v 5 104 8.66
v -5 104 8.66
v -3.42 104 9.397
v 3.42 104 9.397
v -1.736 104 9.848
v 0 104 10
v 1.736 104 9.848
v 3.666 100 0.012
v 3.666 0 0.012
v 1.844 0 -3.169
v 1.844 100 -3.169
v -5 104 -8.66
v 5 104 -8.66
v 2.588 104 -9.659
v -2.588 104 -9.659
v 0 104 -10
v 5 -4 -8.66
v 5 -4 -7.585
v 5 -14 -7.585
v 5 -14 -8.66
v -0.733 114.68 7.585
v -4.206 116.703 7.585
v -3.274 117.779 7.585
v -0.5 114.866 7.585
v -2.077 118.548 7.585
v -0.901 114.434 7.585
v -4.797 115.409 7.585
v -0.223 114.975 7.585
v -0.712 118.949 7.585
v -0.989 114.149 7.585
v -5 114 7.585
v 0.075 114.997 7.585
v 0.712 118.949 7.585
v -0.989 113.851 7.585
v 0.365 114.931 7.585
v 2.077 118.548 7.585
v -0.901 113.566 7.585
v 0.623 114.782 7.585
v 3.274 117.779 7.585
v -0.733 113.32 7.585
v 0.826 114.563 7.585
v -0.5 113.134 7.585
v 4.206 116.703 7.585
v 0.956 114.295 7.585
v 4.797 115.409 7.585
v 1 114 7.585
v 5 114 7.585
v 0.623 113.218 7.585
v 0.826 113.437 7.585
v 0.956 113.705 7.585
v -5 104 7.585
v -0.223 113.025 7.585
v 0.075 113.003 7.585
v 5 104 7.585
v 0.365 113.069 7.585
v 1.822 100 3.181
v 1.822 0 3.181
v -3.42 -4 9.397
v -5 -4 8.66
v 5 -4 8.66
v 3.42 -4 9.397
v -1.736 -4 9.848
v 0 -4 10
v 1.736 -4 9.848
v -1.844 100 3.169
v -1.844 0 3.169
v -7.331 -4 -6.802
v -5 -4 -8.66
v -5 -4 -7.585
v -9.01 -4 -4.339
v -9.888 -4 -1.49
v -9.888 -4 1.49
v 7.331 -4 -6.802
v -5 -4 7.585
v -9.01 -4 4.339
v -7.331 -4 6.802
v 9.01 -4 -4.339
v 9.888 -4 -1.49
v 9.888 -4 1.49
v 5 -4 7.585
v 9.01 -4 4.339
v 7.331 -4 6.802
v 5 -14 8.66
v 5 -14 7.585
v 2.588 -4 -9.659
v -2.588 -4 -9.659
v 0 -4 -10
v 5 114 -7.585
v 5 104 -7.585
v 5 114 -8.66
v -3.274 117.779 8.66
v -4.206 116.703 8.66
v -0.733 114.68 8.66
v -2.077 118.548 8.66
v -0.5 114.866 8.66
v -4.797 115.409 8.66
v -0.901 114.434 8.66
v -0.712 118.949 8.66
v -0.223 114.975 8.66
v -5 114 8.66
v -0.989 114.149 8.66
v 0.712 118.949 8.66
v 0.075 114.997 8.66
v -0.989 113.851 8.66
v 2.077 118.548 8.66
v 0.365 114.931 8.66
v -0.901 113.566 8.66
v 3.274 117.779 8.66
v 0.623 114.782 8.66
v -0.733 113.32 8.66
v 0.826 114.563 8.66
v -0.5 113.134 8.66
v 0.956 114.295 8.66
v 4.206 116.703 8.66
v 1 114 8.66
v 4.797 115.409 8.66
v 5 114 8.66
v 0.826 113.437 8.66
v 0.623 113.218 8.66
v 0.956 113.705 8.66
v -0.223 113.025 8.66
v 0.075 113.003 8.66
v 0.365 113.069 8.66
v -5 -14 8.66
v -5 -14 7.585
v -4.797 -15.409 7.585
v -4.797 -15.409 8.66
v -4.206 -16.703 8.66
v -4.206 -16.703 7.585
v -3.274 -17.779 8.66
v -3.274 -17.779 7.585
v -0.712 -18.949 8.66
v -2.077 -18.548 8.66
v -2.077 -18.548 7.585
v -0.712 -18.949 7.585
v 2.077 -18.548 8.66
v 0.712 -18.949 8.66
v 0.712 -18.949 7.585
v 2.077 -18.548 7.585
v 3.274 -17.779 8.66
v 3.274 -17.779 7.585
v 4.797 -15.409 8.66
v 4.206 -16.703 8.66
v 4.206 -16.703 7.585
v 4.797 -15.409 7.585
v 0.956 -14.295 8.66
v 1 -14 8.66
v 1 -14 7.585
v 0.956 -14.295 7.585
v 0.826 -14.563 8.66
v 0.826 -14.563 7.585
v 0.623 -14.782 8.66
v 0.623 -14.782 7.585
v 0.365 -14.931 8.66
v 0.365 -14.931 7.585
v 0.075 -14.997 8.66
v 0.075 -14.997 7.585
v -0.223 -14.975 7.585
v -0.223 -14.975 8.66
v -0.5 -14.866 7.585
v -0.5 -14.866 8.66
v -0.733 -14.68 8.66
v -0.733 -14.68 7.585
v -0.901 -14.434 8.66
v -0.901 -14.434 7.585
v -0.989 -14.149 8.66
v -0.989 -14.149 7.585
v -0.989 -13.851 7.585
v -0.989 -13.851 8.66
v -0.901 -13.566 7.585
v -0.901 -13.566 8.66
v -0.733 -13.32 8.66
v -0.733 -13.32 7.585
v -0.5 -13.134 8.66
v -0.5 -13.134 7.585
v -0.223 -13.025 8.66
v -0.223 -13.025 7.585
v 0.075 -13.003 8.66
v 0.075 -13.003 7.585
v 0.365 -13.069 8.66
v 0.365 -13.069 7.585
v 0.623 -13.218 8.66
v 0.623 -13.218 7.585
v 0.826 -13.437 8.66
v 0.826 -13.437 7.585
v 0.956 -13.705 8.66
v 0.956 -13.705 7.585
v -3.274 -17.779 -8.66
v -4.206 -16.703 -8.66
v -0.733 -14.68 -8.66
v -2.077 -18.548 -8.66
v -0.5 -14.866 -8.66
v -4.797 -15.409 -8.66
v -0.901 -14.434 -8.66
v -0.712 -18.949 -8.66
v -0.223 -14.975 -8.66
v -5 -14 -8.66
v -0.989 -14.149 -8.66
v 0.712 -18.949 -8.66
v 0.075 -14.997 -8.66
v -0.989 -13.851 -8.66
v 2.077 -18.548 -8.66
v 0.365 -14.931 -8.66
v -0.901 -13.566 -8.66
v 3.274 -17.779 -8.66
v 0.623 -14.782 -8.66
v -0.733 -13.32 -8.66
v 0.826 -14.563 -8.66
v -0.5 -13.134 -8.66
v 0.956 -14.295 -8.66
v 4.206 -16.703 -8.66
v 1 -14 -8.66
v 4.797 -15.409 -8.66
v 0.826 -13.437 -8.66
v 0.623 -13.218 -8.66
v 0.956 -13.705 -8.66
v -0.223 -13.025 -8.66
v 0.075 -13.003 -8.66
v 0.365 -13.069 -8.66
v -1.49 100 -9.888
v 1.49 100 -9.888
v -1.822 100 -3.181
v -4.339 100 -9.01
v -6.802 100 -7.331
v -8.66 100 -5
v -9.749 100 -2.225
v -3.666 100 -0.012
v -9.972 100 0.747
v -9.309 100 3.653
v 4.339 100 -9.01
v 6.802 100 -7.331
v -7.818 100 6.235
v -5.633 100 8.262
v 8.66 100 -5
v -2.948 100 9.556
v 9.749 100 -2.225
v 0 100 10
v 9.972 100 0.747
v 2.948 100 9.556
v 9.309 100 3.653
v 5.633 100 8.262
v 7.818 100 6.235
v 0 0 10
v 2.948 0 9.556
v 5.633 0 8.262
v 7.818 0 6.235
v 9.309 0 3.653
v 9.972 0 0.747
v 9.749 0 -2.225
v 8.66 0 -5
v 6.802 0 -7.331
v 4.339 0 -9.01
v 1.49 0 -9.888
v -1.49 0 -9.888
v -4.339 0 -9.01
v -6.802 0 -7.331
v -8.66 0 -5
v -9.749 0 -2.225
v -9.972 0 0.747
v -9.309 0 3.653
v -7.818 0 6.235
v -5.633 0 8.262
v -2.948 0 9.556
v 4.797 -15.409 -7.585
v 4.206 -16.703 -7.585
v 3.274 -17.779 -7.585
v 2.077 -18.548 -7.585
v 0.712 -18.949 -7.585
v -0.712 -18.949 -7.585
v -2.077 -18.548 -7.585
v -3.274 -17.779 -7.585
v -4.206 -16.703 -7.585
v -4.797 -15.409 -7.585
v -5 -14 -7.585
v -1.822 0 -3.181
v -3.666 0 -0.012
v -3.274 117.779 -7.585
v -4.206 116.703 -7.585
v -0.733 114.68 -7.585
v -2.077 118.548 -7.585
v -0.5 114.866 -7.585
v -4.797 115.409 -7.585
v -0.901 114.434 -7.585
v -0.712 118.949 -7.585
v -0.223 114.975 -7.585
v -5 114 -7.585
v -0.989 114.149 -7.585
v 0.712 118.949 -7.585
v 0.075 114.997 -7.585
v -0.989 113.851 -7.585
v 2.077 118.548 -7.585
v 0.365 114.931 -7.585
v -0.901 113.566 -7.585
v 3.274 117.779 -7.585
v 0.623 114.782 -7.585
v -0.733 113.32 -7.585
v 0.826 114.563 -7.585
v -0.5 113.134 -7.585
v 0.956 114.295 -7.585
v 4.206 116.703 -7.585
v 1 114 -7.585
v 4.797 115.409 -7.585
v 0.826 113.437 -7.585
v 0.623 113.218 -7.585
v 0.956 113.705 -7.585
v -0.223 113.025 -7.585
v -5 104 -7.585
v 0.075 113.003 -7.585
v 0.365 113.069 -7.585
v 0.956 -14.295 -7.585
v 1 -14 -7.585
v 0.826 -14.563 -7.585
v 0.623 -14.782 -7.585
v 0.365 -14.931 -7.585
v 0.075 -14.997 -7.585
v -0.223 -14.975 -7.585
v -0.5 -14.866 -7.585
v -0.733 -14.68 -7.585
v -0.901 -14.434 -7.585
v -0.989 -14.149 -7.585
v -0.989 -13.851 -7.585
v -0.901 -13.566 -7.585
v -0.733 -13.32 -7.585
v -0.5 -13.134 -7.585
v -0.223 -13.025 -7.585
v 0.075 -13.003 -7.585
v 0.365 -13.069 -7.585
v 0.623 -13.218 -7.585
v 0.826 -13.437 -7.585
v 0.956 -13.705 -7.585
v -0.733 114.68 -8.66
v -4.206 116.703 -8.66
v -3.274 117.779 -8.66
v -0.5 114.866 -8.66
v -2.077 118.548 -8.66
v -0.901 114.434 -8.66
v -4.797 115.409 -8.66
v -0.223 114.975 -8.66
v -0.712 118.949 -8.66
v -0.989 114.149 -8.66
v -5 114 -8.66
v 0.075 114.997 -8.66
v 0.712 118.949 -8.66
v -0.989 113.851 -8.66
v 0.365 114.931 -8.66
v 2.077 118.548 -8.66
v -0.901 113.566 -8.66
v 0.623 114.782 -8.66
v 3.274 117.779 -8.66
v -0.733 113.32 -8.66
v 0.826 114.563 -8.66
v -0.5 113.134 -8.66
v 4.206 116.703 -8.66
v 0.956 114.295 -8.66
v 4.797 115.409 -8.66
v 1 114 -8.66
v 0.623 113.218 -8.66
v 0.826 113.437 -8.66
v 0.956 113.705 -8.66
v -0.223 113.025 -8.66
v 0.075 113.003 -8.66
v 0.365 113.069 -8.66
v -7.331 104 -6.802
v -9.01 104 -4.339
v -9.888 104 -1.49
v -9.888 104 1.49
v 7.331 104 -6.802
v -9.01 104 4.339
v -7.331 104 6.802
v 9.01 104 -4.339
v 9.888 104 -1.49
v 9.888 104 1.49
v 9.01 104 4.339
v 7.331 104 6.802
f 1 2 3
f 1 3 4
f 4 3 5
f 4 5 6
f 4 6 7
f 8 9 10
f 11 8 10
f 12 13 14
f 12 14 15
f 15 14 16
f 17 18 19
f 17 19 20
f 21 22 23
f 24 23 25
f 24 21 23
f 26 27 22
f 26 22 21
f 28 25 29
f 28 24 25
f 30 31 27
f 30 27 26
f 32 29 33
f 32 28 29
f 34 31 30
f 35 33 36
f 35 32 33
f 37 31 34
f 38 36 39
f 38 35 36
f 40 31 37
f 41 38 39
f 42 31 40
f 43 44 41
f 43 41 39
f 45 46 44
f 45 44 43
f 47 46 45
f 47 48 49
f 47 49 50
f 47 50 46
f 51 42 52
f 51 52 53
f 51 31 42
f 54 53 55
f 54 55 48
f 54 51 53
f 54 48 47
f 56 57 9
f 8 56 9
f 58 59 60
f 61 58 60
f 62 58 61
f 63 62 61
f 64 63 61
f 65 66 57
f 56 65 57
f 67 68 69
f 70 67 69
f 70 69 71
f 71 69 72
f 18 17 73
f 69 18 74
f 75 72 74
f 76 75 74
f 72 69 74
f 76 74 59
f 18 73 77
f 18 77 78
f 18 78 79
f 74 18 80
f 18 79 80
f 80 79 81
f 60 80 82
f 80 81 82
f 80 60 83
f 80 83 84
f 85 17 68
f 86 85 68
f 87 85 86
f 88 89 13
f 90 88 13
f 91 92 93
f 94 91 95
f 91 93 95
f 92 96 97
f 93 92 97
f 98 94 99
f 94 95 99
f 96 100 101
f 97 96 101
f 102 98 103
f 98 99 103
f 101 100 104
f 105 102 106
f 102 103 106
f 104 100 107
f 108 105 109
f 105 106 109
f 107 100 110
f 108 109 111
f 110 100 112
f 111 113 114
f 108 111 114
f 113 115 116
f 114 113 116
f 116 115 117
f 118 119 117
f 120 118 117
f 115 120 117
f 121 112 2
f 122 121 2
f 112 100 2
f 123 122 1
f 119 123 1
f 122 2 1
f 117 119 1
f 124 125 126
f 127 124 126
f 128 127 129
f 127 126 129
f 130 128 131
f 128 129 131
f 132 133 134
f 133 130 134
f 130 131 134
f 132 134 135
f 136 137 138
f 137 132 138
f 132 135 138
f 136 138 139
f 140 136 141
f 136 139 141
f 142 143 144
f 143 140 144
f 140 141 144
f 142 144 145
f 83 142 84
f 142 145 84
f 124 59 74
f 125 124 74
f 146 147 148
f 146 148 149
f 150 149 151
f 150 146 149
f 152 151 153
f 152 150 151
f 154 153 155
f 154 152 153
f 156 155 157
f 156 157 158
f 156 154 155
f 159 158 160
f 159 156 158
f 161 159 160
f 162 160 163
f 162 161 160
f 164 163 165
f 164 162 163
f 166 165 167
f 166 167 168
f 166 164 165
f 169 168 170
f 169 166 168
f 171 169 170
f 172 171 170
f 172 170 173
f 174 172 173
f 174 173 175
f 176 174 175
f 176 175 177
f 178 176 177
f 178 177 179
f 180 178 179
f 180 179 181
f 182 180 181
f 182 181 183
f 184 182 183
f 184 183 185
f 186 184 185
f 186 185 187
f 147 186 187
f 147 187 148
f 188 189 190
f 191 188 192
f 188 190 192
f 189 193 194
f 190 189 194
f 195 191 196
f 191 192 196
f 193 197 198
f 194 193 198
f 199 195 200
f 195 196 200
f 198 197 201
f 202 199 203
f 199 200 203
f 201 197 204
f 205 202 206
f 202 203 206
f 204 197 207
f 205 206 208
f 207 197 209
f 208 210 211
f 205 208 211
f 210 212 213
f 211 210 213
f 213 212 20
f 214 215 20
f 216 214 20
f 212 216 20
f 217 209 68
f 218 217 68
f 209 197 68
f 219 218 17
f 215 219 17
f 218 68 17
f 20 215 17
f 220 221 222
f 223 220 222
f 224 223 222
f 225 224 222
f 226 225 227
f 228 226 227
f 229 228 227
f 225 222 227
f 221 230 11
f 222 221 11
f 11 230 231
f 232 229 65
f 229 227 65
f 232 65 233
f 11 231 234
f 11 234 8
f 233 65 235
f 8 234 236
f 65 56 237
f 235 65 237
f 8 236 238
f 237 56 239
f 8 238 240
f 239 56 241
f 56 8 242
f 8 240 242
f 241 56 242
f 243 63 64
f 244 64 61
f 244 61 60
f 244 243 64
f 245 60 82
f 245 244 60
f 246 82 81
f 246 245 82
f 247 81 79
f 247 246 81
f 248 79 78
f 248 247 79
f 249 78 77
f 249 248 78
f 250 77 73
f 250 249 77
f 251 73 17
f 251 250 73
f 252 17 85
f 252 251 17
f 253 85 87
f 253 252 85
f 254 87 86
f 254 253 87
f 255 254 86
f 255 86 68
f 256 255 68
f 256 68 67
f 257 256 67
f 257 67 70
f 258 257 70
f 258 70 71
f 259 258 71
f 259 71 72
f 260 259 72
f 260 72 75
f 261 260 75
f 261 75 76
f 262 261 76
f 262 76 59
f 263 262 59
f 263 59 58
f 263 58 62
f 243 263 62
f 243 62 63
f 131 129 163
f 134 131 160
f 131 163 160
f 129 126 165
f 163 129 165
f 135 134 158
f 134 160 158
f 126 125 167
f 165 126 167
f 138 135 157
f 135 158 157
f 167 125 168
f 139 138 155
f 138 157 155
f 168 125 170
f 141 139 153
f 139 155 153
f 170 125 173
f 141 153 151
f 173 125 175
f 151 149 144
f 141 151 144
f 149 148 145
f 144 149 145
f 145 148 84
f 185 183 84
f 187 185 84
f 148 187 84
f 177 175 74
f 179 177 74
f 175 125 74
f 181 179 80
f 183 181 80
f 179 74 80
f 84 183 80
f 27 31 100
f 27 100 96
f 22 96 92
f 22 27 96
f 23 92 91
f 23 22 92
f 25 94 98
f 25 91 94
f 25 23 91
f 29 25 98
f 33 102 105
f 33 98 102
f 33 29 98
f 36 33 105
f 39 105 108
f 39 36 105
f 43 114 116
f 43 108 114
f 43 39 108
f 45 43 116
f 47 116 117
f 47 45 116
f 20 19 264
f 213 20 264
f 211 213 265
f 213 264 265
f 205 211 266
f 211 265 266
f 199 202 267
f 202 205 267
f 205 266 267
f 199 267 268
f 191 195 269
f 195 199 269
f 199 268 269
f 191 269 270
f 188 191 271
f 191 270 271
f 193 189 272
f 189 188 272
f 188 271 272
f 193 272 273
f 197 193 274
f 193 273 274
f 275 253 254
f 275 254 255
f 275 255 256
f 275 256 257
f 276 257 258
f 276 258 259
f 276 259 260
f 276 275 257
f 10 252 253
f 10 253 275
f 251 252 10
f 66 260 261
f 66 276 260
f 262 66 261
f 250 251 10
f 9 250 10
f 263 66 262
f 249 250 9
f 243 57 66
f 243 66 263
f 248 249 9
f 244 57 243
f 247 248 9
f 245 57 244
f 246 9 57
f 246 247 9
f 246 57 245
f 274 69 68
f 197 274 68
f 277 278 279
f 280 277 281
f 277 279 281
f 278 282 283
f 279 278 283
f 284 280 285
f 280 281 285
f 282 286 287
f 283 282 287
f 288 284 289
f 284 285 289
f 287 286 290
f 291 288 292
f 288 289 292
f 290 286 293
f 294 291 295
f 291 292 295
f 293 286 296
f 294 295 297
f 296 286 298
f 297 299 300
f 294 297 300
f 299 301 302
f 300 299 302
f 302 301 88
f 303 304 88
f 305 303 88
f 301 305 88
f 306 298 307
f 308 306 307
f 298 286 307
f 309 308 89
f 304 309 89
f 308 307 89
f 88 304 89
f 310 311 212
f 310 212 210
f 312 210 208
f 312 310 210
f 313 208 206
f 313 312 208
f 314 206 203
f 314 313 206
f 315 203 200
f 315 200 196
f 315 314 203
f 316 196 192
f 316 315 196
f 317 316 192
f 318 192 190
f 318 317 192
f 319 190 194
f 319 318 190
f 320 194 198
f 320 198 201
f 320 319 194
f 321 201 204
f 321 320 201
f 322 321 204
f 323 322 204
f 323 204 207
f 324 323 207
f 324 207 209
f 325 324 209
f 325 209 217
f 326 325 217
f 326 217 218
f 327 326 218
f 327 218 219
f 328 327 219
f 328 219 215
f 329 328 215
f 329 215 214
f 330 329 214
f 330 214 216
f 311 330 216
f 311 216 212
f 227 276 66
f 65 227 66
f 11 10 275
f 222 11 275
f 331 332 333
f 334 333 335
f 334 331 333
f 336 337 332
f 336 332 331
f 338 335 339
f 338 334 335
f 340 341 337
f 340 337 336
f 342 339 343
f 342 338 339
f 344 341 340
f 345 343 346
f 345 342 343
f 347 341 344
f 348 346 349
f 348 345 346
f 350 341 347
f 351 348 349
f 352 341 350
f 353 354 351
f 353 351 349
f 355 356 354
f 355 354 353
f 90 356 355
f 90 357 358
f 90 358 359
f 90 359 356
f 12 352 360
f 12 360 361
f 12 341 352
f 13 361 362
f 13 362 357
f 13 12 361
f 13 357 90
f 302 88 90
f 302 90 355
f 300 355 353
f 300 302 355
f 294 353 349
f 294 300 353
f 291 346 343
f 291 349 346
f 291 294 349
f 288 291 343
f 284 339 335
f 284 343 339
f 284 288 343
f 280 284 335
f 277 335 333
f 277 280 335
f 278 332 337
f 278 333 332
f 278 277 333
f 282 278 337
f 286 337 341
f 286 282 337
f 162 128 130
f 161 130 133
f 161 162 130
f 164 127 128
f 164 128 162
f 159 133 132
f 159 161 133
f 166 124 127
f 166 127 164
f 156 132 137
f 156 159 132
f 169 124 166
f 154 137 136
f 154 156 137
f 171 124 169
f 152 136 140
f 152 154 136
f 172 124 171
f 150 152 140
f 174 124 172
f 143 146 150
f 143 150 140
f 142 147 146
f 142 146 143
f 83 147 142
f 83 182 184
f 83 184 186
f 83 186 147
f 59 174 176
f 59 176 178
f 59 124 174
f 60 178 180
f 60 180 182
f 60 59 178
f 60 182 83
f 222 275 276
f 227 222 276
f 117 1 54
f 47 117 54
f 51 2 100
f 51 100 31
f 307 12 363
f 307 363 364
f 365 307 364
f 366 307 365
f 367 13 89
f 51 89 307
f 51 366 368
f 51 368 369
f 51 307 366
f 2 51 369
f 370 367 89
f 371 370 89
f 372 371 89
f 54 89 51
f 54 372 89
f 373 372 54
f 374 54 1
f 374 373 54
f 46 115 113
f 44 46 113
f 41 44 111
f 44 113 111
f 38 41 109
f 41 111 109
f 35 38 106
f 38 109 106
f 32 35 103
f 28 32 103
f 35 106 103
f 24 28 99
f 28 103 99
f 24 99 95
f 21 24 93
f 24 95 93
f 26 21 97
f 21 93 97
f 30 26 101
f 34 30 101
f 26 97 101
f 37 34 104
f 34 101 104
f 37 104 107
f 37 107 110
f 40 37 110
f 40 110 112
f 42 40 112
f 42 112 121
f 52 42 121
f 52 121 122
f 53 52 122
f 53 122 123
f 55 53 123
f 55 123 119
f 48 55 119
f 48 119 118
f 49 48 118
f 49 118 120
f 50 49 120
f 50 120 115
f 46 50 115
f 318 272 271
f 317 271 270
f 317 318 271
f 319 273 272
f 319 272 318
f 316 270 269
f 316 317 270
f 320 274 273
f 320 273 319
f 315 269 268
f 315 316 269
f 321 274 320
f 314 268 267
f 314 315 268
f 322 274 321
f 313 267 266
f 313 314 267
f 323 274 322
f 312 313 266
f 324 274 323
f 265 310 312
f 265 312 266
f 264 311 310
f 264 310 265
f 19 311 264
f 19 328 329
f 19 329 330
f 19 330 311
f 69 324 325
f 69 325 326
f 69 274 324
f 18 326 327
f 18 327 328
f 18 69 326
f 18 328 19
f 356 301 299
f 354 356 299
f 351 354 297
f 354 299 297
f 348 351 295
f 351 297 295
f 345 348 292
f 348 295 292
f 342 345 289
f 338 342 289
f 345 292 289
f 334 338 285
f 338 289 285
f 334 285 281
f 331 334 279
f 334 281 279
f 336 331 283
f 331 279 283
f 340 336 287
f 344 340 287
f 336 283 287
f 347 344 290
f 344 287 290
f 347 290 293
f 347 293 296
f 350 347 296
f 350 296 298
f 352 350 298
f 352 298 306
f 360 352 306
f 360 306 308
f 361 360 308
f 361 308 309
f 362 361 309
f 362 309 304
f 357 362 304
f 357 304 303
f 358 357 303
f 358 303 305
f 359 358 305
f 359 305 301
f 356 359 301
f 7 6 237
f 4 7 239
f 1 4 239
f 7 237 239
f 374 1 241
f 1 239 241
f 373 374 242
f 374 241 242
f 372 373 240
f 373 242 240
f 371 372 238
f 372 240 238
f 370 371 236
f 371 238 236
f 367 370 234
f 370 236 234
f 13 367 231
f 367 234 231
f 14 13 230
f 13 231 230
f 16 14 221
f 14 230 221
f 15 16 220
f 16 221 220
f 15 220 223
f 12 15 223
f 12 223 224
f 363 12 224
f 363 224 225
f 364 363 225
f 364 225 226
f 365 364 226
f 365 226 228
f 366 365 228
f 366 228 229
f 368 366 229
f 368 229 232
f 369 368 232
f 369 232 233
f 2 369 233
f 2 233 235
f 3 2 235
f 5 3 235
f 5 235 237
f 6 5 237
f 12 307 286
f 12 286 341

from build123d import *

# Parameters (mm, degrees)
BOSS_EXTRUDE1_DEPTH = 100
SKETCH3_R           = 10
BOSS_EXTRUDE2_DEPTH = 4
SKETCH5_W           = 10
SKETCH5_H           = 1.075357982
BOSS_EXTRUDE3_DEPTH = 15
FILLET3_RADIUS      = 5
FILLET3_LENGTH      = 1.075357982
FILLET4_RADIUS      = 5
FILLET4_LENGTH      = 1.075357982
CUT_EXTRUDE1_REACH  = 122.869
SKETCH6_R           = 1


with BuildPart() as part:
    # Sketch2 → Boss-Extrude1 (new body)
    with BuildSketch(Plane(origin=(0, 0, 0), x_dir=(1, 0, 0), z_dir=(0, 1, 0))):
        Polygon((1.843695467, 3.168851584), (-1.822458239, 3.181112903), (-3.666153706, 0.012261319), (-1.843695467, -3.168851584), (1.822458239, -3.181112903), (3.666153706, -0.012261319), align=None)
    extrude(amount=BOSS_EXTRUDE1_DEPTH)

    # Sketch3 → Boss-Extrude2 (add)
    with BuildSketch(Plane(origin=(0, 100, 0), x_dir=(1, 0, 0), z_dir=(0, 1, 0))):
        with Locations(Location((0, 0, 0), (0, 0, 270))):
            Circle(SKETCH3_R)
    extrude(amount=BOSS_EXTRUDE2_DEPTH)

    # Sketch5 → Boss-Extrude3 (add)
    with BuildSketch(Plane(origin=(0, 104, 0), x_dir=(1, 0, 0), z_dir=(0, 1, 0))):
        with Locations((0, 8.122575047)):
            Rectangle(SKETCH5_W, SKETCH5_H)
        with Locations((0, -8.122575047)):
            Rectangle(SKETCH5_W, SKETCH5_H)
    extrude(amount=BOSS_EXTRUDE3_DEPTH)

    # Fillet3: full round fillet: the end face becomes a half cylinder, R = half its width
    fillet3_face = Plane((0, 119, 8.122575047), x_dir=(0, 0, -1), z_dir=(0, 1, 0))  # on the end face: x along it, z out of the body
    fillet3_slab = fillet3_face.offset(-FILLET3_RADIUS / 2) * Box(FILLET3_LENGTH, 2 * FILLET3_RADIUS, FILLET3_RADIUS, mode=Mode.PRIVATE)  # the body's end, R deep
    fillet3_round = Plane((0, 114, 8.122575047), x_dir=(0, 1, 0), z_dir=(0, 0, -1)) * Cylinder(FILLET3_RADIUS, FILLET3_LENGTH, mode=Mode.PRIVATE)  # its axis R under the face
    add(fillet3_slab - fillet3_round, mode=Mode.SUBTRACT)

    # Fillet4: full round fillet: the end face becomes a half cylinder, R = half its width
    fillet4_face = Plane((0, 119, -8.122575047), x_dir=(0, 0, 1), z_dir=(0, 1, 0))  # on the end face: x along it, z out of the body
    fillet4_slab = fillet4_face.offset(-FILLET4_RADIUS / 2) * Box(FILLET4_LENGTH, 2 * FILLET4_RADIUS, FILLET4_RADIUS, mode=Mode.PRIVATE)  # the body's end, R deep
    fillet4_round = Plane((0, 114, -8.122575047), x_dir=(0, 1, 0), z_dir=(0, 0, 1)) * Cylinder(FILLET4_RADIUS, FILLET4_LENGTH, mode=Mode.PRIVATE)  # its axis R under the face
    add(fillet4_slab - fillet4_round, mode=Mode.SUBTRACT)

    # Cut-Extrude1: up to this face of the body (flat: up to its plane)
    cut_extrude1_end = Plane(part.part.faces().sort_by_distance((0, 111.008207501, -8.660254038))[0])
    # Sketch6 → Cut-Extrude1 (cut, up to the picked face)
    with BuildSketch(Plane.XY.offset(8.660254038), mode=Mode.PRIVATE) as cut_extrude1_sk1:
        with Locations((0, 114)):
            Circle(SKETCH6_R)
    cut_extrude1_tool1 = split(extrude(cut_extrude1_sk1.sketch, amount=-CUT_EXTRUDE1_REACH, mode=Mode.PRIVATE), bisect_by=cut_extrude1_end, keep=Keep.BOTH, mode=Mode.PRIVATE)
    add(cut_extrude1_tool1.solids().sort_by(Axis((0, 114, 8.660254), (0, 0, -1)))[0], mode=Mode.SUBTRACT)

    # Mirror1: part across plane


with BuildPart() as part_1:
    add(part.part)
    add(part.part.mirror(Plane(origin=(0, 50, 0), x_dir=(0, 0, 1), z_dir=(0, -1, 0))))


solid = part_1.part
